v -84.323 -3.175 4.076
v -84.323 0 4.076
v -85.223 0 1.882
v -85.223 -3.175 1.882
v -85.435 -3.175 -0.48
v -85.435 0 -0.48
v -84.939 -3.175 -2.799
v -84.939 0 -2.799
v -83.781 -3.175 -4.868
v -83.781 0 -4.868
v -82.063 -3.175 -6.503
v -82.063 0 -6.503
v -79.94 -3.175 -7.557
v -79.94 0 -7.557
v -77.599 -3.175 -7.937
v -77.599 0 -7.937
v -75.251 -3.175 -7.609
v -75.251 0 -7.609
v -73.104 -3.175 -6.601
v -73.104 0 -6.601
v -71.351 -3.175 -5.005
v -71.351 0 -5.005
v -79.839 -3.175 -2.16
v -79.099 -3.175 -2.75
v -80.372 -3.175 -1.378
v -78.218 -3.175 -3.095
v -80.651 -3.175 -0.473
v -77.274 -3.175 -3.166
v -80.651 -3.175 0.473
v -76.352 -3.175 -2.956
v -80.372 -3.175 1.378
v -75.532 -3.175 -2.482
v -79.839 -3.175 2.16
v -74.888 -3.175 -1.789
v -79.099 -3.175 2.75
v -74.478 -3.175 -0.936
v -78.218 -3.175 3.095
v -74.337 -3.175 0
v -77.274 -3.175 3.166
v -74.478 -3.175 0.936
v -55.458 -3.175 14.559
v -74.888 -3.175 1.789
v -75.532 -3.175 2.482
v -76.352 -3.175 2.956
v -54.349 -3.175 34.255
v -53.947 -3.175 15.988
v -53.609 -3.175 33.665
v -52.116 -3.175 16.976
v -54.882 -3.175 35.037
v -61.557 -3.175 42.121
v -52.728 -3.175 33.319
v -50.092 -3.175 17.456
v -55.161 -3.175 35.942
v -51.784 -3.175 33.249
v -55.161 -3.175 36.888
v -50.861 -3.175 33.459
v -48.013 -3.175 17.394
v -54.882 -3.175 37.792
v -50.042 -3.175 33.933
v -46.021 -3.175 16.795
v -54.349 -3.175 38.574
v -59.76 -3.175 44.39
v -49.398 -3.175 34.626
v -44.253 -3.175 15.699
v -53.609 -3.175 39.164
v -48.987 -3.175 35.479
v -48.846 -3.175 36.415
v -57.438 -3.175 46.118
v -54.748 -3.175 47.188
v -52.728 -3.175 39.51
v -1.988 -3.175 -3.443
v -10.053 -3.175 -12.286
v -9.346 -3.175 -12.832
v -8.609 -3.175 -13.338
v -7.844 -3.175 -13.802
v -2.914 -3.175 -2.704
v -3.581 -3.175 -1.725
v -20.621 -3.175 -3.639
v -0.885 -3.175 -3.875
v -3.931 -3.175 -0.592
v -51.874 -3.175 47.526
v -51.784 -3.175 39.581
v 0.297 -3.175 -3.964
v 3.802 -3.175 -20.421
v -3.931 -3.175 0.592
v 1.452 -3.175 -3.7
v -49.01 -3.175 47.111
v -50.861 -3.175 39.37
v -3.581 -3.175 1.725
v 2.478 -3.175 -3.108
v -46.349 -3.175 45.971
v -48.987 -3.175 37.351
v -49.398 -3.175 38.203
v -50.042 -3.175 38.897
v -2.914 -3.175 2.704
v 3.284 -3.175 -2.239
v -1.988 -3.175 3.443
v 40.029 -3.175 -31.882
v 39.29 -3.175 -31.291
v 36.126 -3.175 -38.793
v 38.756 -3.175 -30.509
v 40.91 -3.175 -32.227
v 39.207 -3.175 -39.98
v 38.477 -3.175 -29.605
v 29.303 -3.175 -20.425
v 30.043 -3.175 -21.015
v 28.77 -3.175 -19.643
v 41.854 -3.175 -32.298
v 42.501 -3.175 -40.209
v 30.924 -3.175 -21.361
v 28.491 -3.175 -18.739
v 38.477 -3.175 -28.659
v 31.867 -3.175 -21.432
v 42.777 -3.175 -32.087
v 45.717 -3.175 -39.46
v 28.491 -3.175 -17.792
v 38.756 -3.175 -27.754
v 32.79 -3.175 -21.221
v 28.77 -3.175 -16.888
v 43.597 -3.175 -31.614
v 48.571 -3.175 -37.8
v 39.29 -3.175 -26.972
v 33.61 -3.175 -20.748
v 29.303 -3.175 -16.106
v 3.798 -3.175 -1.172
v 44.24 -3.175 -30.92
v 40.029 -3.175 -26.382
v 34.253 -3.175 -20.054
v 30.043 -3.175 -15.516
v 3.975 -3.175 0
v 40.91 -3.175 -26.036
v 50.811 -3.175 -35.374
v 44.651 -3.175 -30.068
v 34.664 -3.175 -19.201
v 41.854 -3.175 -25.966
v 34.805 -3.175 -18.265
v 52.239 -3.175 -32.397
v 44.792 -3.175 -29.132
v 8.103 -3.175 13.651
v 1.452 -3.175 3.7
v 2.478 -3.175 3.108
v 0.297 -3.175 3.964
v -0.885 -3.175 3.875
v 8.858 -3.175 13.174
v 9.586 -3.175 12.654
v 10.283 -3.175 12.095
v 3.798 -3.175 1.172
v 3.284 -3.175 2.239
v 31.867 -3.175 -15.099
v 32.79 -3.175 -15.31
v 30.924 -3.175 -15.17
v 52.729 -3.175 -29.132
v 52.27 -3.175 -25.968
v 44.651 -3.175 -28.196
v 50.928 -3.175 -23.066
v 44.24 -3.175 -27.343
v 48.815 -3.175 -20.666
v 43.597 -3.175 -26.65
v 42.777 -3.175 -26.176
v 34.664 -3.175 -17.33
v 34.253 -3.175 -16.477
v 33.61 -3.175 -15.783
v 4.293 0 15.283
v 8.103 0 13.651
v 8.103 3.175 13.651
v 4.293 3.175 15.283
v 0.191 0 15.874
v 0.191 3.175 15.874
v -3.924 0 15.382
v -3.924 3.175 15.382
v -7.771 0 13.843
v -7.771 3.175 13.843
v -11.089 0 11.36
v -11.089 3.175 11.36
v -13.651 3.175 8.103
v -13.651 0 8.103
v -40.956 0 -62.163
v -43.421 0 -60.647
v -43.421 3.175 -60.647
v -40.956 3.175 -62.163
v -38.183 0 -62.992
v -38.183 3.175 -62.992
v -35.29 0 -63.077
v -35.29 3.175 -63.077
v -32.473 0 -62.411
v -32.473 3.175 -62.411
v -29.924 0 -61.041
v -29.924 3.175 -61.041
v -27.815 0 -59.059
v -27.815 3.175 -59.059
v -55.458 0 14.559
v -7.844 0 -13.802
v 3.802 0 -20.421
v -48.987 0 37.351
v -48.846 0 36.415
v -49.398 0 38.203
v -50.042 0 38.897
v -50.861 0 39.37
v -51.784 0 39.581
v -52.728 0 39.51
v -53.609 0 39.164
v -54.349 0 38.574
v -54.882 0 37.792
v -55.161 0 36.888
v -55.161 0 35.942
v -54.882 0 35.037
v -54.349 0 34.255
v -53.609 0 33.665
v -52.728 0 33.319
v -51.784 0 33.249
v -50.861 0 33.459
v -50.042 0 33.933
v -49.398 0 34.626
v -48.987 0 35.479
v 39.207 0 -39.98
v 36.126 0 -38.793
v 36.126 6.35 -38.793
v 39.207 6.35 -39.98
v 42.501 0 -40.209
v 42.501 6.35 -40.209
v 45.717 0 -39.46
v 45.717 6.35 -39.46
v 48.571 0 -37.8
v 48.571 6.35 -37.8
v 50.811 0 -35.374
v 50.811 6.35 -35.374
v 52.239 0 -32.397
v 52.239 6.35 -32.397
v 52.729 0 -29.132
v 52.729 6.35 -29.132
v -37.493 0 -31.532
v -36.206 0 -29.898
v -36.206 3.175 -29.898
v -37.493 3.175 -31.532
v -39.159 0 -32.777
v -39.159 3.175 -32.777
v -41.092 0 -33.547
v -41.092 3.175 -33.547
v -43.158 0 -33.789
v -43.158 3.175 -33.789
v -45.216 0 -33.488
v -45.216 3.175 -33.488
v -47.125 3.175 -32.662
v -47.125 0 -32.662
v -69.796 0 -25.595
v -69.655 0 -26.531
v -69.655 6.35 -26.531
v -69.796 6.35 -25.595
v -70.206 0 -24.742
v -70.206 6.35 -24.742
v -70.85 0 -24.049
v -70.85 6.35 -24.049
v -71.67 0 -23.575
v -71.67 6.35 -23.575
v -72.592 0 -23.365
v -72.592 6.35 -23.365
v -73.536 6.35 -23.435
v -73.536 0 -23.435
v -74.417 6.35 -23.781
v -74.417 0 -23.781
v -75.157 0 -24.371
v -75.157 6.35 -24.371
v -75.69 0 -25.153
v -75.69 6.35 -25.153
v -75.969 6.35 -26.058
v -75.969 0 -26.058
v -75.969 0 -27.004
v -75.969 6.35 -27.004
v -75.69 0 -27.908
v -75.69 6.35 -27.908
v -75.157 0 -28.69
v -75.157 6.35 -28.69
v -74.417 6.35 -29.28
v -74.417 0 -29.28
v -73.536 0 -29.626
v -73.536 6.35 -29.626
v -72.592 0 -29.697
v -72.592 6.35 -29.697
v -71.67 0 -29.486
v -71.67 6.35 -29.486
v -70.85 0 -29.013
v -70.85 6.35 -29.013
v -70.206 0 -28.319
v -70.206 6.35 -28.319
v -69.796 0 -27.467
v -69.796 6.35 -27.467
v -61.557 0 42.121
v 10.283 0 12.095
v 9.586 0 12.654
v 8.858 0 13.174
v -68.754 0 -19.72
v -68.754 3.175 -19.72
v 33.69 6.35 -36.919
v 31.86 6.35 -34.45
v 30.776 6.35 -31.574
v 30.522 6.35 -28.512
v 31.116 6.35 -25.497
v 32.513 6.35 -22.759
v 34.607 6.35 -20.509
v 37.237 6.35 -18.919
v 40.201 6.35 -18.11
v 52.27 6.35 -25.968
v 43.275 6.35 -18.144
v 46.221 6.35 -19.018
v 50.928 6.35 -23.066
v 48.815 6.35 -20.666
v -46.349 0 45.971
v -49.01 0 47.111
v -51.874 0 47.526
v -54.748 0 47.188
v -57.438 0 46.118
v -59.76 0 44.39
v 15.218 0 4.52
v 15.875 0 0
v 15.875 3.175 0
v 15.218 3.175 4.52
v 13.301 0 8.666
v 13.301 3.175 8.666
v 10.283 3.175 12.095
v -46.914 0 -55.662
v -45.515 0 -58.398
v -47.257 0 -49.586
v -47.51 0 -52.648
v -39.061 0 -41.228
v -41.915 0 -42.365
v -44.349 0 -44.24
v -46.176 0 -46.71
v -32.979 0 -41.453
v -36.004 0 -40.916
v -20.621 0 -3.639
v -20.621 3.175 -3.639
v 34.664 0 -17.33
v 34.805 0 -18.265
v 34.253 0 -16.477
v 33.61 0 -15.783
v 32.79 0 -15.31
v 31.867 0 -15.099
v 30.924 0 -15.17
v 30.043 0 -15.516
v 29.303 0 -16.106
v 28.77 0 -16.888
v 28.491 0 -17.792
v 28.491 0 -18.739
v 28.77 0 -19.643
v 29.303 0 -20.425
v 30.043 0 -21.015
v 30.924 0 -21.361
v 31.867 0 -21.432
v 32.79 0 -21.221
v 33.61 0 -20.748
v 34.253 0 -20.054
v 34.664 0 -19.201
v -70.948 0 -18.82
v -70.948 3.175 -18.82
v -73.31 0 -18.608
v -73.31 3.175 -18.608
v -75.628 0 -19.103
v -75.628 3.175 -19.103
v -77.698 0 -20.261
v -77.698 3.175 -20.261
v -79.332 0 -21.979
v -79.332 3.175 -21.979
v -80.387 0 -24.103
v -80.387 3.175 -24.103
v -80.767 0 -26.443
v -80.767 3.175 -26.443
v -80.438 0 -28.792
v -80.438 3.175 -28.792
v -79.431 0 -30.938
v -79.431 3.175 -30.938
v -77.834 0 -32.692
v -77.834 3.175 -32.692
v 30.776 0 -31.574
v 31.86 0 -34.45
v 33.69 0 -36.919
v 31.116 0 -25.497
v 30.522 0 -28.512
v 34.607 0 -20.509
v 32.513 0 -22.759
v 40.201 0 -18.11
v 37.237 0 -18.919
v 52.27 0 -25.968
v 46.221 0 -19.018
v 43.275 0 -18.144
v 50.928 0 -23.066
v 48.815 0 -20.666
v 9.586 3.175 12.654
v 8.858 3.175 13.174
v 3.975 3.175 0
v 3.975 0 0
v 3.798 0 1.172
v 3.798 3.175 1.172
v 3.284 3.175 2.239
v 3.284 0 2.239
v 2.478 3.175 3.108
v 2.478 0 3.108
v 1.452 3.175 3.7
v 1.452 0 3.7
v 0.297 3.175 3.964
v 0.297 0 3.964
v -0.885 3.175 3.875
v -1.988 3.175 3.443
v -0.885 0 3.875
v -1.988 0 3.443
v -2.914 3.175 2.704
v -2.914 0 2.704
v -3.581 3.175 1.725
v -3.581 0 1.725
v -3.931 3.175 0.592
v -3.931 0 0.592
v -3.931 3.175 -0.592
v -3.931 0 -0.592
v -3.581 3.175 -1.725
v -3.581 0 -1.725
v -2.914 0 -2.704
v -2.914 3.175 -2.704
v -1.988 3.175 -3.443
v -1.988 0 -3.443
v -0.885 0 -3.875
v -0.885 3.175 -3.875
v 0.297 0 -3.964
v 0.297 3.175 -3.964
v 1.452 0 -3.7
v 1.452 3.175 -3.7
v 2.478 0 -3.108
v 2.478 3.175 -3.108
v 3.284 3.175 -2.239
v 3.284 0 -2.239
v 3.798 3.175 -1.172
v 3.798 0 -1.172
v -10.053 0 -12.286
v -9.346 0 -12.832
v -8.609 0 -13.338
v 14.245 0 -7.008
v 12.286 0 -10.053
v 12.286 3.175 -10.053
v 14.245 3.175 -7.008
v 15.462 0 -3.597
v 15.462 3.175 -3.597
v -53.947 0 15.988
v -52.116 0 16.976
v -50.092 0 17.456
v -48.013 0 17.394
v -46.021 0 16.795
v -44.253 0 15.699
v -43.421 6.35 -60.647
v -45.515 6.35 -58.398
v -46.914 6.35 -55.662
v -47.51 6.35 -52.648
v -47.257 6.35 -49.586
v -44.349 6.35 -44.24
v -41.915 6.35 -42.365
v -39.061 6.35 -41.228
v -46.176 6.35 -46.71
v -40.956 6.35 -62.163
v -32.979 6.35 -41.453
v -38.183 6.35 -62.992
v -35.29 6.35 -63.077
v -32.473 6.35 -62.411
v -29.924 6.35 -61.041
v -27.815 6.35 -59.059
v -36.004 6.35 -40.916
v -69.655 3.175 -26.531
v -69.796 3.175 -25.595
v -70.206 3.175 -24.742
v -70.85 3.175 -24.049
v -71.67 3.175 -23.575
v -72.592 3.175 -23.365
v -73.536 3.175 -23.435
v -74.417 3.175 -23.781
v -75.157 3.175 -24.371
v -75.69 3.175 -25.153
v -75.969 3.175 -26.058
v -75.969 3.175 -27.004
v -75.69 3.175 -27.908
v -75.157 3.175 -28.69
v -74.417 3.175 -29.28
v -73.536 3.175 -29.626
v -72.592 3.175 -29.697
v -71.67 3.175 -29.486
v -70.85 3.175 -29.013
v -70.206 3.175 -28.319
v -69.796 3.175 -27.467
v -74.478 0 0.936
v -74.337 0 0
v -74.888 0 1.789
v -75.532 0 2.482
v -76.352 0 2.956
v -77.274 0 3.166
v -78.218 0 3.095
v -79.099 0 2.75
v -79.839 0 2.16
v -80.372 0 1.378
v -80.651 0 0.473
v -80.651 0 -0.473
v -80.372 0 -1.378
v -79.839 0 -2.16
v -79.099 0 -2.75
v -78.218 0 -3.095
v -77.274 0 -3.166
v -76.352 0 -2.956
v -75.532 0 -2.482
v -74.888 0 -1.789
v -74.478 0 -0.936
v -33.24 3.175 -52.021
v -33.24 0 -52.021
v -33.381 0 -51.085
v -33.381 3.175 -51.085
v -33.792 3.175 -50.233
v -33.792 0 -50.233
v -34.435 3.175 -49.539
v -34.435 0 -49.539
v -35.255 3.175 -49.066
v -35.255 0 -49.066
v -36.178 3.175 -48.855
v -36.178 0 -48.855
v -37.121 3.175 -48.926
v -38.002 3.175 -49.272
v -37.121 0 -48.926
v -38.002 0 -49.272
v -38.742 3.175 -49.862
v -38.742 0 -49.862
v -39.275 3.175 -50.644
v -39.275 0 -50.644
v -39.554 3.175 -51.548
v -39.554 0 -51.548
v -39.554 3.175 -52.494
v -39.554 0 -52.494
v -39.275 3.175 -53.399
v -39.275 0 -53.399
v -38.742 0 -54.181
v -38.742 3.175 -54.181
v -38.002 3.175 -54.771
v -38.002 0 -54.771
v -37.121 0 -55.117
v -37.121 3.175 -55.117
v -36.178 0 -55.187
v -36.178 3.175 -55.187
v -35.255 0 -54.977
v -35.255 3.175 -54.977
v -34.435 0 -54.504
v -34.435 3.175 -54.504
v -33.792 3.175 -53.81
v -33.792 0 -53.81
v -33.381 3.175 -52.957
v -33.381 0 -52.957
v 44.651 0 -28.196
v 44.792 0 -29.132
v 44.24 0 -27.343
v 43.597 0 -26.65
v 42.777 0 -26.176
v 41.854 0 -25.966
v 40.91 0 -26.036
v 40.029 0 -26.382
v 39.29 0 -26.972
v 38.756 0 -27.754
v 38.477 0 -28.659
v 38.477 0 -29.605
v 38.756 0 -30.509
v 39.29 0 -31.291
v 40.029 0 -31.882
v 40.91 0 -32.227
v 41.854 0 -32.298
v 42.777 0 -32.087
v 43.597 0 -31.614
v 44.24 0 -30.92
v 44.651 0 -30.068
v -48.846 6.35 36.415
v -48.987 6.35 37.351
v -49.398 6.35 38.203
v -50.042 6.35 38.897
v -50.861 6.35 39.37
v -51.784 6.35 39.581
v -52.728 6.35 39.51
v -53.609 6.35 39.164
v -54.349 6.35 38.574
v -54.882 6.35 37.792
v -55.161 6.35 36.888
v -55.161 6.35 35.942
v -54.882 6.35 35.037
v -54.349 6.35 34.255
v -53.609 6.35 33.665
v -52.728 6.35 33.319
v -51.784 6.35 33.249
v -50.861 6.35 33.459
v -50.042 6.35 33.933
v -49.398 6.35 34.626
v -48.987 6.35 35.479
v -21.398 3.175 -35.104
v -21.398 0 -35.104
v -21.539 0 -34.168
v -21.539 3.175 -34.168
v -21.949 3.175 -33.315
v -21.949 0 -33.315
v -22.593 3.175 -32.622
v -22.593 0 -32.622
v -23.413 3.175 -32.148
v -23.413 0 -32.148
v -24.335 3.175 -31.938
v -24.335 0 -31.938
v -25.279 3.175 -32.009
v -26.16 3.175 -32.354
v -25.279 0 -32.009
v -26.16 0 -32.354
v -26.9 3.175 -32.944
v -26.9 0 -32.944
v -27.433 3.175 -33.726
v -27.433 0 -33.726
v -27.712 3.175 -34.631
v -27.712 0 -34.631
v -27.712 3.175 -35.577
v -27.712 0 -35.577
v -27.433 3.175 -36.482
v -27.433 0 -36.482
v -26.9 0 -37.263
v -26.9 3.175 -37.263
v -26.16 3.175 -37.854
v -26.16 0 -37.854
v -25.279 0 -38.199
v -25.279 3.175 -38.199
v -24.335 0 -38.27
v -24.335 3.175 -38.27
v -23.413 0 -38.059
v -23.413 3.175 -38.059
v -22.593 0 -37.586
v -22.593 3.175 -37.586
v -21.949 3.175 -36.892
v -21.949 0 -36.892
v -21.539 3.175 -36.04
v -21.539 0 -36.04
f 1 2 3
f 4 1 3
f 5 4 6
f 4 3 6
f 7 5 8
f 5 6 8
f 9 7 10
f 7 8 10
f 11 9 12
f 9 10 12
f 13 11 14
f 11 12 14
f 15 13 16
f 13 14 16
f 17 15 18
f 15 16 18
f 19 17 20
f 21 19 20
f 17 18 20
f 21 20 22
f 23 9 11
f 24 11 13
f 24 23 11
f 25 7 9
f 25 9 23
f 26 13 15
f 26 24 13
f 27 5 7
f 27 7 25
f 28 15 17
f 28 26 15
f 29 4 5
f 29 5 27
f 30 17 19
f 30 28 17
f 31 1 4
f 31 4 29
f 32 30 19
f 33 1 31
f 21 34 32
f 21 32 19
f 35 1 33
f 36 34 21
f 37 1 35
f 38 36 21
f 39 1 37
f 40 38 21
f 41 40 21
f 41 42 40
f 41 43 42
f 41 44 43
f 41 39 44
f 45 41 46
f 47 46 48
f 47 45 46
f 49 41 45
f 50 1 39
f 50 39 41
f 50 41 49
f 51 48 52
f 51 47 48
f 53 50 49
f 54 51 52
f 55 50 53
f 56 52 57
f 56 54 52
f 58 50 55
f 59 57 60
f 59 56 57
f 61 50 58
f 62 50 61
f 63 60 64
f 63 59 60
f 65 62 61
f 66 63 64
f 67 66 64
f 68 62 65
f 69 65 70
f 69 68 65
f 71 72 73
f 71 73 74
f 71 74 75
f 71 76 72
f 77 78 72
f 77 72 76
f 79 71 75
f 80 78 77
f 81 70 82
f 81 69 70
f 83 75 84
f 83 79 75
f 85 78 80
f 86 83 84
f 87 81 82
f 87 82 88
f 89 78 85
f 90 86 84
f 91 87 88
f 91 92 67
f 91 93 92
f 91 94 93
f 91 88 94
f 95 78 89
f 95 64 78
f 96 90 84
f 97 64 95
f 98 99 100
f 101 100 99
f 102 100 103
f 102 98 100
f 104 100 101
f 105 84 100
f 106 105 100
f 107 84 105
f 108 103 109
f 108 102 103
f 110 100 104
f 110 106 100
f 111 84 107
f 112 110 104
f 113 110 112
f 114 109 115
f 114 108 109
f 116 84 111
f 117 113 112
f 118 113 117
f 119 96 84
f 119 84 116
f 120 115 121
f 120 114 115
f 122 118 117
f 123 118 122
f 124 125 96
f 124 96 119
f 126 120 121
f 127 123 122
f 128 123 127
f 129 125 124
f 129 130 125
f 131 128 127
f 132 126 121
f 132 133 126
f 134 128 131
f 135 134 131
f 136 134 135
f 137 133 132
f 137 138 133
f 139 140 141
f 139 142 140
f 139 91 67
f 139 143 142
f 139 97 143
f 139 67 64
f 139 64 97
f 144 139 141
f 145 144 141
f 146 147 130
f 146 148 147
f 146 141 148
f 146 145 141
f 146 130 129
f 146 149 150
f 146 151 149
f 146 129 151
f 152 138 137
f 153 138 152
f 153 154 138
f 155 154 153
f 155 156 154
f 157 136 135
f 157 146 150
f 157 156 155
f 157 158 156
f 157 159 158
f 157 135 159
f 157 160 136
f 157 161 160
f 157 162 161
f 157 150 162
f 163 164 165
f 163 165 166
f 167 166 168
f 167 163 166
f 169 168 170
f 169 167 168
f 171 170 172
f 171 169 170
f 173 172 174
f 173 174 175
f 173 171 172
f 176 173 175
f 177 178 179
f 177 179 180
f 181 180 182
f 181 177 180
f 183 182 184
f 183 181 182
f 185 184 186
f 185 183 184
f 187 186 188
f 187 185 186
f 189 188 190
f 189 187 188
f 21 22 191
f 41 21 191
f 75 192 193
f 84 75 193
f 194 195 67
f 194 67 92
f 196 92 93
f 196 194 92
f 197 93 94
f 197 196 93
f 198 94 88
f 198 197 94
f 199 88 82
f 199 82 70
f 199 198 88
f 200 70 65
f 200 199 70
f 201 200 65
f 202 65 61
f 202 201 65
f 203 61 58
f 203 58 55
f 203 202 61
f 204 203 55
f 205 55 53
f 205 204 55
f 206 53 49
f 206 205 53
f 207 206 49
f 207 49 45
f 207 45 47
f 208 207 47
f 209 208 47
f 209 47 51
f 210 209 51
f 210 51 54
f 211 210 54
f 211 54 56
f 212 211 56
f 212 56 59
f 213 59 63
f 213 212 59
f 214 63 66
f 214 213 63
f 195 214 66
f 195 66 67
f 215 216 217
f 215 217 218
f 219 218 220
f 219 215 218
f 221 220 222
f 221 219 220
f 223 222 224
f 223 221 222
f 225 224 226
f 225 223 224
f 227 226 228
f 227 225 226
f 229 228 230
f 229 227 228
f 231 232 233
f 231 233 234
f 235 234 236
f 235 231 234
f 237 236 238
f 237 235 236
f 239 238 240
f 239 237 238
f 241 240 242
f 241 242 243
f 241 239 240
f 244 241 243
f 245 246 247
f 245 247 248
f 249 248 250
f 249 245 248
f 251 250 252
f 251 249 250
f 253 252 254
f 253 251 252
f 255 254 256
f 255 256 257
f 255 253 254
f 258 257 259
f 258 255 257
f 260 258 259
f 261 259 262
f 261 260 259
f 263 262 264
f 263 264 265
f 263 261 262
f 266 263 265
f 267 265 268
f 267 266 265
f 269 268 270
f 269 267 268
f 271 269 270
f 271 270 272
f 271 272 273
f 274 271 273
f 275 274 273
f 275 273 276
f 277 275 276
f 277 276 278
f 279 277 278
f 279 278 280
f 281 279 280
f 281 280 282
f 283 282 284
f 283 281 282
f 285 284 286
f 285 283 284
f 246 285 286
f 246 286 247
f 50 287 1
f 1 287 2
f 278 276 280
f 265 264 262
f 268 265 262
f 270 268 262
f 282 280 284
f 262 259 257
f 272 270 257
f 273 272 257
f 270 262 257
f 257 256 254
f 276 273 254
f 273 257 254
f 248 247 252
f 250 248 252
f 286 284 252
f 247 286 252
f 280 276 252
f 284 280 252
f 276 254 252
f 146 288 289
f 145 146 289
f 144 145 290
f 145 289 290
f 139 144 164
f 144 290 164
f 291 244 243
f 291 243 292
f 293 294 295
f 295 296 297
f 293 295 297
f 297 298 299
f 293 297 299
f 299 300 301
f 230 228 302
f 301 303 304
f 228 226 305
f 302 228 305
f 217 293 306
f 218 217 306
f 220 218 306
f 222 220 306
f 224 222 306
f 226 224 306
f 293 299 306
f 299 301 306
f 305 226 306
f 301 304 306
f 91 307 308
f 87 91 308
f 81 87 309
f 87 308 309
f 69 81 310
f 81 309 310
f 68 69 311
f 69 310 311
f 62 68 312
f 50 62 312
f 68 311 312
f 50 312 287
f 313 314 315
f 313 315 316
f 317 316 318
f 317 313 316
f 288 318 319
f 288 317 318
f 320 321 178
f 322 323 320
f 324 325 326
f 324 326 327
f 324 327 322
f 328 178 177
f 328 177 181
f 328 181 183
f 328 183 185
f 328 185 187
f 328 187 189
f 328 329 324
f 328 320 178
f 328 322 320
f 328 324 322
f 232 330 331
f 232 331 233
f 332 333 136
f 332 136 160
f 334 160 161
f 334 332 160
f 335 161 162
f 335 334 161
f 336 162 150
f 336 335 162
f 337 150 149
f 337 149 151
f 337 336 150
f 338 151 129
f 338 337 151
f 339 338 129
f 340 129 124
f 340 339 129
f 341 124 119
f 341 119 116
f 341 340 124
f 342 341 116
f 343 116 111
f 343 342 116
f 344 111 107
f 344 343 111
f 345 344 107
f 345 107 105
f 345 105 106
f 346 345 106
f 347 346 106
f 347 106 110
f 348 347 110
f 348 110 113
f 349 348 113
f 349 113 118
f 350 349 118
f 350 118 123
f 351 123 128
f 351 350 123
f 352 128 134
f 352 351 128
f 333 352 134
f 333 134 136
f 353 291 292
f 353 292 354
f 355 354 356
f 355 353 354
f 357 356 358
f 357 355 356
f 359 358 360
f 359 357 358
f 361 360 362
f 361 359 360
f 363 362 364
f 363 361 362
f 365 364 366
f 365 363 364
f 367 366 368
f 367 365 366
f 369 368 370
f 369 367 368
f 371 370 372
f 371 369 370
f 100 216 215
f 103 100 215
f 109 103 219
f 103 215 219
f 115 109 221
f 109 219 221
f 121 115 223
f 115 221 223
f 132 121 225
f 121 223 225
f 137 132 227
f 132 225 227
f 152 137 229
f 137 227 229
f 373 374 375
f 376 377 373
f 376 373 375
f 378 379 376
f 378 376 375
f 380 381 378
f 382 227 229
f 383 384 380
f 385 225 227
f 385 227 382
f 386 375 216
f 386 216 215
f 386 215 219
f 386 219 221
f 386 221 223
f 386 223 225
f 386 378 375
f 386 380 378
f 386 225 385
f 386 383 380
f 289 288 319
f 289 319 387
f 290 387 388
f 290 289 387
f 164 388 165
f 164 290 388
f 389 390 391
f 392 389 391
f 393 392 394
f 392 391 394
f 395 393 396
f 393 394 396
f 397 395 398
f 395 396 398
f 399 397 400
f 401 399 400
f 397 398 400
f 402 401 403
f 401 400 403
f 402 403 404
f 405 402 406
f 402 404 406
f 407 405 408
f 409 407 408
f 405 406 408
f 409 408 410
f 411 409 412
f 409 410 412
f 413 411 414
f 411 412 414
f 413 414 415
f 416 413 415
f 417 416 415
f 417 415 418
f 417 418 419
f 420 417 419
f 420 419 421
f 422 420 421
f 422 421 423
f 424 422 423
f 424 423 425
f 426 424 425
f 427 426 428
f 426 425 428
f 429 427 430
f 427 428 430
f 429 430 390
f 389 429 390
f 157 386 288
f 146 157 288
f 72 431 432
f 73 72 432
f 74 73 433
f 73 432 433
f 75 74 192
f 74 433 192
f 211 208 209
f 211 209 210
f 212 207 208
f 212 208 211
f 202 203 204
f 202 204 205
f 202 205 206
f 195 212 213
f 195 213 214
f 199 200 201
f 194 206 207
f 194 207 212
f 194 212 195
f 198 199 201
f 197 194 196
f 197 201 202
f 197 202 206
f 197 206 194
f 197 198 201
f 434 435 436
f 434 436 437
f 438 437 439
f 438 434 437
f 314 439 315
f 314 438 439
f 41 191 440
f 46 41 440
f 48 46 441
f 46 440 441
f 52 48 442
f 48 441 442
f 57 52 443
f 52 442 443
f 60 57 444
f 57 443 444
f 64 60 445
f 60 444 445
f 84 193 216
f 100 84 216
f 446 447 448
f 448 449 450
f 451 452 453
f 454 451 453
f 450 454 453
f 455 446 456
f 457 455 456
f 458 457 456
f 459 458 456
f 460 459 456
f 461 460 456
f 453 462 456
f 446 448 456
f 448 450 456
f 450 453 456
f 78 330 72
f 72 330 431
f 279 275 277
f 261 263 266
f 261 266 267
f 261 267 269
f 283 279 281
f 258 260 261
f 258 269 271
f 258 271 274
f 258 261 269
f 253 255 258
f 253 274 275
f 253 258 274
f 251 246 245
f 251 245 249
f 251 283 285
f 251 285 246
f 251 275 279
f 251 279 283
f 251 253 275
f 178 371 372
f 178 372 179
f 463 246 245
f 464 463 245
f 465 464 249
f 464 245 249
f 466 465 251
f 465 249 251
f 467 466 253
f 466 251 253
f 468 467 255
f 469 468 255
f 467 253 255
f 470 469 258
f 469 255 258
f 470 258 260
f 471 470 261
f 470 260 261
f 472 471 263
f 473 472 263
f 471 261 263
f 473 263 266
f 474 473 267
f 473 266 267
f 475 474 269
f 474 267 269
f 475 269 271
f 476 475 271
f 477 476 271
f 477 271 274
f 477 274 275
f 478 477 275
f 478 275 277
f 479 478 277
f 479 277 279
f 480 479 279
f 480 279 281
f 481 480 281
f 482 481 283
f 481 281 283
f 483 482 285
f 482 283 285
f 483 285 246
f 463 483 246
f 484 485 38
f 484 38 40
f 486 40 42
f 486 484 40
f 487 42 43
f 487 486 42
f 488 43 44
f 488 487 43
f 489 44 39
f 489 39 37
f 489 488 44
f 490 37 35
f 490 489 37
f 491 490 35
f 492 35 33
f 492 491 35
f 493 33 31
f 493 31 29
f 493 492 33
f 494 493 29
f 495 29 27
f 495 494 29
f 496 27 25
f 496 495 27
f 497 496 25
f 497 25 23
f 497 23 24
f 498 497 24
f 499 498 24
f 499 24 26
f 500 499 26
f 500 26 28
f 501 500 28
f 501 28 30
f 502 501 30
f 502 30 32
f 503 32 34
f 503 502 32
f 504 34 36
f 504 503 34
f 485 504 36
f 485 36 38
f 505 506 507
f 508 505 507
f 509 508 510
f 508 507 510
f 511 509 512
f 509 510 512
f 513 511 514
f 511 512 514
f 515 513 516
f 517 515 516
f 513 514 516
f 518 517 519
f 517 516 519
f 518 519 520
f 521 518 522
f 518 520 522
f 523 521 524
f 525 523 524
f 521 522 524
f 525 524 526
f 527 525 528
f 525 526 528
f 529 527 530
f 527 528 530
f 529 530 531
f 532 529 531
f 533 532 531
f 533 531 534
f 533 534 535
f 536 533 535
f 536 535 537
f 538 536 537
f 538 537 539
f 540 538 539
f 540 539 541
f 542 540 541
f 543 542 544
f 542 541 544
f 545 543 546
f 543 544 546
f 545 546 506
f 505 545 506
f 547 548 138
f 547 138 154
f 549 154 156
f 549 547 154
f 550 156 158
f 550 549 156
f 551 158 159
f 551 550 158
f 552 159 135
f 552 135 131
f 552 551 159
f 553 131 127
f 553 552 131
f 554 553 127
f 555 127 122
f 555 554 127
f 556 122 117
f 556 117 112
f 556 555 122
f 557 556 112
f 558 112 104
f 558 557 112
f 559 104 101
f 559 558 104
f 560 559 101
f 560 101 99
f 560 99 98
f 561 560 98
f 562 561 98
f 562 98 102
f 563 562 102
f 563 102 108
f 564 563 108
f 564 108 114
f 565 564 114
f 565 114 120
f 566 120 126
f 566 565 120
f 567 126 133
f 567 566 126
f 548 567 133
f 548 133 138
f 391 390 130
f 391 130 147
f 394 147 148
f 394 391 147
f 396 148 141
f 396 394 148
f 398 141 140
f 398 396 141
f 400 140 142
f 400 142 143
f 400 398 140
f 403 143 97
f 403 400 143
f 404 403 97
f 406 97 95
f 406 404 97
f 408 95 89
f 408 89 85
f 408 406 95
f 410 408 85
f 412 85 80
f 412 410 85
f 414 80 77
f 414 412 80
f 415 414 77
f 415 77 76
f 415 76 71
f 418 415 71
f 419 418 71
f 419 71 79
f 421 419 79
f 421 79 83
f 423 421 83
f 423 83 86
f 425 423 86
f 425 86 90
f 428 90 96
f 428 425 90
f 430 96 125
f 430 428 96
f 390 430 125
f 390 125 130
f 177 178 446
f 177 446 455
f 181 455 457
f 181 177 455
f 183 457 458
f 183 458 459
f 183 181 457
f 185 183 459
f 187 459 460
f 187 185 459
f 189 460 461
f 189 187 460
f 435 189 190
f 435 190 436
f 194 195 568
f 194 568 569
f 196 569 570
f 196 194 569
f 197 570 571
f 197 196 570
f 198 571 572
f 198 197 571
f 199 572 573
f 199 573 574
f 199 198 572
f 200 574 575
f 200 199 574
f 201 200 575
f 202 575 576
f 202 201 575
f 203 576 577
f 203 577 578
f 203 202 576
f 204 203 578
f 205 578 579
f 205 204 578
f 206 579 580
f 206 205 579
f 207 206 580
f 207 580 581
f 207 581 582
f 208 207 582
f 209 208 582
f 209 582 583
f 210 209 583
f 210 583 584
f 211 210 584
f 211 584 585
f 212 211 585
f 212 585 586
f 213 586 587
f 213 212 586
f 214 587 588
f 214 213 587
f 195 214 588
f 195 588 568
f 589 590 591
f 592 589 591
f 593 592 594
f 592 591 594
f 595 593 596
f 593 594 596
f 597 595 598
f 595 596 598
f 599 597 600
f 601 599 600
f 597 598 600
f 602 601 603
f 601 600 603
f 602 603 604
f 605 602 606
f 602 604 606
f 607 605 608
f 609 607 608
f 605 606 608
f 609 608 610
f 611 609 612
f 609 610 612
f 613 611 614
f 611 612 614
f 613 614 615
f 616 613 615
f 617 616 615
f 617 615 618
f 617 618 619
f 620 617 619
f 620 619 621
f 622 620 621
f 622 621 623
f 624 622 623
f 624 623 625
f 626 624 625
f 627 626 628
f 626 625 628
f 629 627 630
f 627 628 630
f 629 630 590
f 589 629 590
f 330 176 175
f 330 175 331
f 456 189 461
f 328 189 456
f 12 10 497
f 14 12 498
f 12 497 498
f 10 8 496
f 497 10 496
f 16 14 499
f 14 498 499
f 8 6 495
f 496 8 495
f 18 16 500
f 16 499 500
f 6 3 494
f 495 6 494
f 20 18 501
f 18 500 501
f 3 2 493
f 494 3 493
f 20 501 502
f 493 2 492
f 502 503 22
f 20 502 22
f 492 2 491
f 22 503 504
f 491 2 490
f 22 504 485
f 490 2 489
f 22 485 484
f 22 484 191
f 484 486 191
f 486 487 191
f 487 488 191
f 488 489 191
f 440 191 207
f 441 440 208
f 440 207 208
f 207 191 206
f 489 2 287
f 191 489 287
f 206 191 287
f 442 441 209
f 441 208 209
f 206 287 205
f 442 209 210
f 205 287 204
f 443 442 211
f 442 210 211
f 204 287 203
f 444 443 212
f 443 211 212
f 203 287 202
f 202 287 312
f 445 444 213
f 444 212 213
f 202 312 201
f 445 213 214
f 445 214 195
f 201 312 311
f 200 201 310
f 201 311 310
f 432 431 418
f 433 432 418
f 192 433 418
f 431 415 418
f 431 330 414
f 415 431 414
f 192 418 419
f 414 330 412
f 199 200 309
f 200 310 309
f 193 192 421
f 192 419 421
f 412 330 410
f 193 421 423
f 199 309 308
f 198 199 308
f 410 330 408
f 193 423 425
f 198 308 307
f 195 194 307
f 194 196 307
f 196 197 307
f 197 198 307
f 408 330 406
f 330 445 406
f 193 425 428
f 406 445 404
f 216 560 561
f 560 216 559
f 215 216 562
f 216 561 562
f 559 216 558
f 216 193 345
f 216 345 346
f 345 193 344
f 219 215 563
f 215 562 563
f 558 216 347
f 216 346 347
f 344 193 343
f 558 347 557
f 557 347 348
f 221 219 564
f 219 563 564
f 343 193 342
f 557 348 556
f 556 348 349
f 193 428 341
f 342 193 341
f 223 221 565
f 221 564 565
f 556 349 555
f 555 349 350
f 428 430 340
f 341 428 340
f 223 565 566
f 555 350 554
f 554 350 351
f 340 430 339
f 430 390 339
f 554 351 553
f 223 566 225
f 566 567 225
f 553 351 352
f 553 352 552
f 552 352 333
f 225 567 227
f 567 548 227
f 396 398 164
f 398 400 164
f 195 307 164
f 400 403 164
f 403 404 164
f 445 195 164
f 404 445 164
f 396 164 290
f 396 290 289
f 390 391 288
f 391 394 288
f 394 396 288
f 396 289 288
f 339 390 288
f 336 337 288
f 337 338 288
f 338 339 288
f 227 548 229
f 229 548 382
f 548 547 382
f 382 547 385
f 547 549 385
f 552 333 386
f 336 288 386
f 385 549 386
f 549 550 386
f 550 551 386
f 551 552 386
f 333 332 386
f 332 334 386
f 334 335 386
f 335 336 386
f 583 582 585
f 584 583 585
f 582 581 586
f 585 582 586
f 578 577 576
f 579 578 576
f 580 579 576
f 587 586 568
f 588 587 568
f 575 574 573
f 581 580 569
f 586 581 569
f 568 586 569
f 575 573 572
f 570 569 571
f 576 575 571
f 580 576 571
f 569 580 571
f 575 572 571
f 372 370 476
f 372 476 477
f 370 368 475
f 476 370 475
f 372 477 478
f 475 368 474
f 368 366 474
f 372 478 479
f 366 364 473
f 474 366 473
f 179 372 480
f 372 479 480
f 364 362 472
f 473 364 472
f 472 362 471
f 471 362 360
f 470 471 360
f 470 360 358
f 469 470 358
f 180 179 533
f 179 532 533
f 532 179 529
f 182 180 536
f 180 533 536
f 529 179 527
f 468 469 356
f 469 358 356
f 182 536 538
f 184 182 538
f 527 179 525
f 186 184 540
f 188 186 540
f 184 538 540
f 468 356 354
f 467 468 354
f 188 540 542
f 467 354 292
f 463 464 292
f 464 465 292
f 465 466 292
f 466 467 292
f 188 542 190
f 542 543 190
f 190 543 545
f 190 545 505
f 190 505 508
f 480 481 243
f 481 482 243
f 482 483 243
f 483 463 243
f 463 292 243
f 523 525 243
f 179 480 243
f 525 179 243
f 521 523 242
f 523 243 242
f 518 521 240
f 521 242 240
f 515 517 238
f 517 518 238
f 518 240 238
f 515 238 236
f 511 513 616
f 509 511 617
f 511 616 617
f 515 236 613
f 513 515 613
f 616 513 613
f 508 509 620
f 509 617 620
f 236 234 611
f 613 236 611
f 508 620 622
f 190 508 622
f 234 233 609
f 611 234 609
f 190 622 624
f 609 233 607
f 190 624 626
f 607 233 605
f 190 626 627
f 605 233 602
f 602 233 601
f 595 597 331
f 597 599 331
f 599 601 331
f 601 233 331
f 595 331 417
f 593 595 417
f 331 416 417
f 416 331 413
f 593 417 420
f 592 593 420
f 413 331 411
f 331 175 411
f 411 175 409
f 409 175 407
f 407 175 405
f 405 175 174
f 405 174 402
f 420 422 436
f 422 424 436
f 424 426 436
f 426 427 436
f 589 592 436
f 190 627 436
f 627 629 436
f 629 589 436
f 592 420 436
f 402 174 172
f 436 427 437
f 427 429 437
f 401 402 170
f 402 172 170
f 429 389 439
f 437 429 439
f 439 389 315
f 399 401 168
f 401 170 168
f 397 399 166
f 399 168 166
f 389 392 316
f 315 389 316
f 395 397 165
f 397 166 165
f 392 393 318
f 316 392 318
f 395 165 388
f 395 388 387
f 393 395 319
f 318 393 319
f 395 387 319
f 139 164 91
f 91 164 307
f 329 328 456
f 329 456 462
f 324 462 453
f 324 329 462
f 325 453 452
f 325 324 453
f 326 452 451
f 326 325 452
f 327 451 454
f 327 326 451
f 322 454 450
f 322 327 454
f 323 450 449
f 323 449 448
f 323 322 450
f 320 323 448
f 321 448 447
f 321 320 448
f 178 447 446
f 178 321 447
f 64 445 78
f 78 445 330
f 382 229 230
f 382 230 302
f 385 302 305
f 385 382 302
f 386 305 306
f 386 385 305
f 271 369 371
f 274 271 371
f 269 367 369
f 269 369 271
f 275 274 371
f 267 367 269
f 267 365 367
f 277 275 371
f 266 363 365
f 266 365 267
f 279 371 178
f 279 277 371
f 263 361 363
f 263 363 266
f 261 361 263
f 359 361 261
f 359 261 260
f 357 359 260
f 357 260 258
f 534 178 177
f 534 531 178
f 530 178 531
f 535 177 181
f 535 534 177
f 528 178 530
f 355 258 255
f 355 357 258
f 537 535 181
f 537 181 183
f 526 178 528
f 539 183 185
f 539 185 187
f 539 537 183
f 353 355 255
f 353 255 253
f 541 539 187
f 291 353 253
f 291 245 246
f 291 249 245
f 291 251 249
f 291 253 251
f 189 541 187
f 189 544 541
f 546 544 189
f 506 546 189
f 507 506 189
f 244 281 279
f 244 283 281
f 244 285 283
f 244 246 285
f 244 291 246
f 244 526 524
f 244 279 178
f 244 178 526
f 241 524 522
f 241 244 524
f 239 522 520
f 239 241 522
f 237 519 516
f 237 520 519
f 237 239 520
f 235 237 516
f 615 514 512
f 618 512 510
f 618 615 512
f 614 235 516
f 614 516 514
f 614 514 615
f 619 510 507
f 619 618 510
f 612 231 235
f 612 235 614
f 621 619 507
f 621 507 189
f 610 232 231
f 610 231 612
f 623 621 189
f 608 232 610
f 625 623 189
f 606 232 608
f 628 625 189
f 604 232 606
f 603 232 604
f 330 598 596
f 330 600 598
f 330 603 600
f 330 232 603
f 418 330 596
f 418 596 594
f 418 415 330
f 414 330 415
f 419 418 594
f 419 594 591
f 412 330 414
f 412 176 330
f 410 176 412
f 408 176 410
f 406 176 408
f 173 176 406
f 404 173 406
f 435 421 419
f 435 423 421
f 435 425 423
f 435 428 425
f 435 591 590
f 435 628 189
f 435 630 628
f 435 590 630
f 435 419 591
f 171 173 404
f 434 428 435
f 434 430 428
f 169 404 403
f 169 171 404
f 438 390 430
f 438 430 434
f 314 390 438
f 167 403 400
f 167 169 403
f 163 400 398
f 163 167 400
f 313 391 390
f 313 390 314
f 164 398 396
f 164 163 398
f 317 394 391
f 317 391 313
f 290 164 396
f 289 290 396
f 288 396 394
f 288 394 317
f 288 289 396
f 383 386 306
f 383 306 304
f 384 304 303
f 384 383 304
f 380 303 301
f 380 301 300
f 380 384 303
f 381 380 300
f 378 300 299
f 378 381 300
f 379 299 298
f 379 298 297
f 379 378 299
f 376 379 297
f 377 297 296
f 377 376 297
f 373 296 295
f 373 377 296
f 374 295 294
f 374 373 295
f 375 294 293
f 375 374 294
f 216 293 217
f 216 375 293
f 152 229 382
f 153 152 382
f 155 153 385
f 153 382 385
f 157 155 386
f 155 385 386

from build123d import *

# Parameters (mm, degrees)
F0_R     = 3.175
F0_R_2   = 3.9751
F1_DEPTH = 3.175
F2_DEPTH = 3.175
F3_DEPTH = 6.35


with BuildPart() as f1:
    # F0 (on Front) → F1 (new body)
    with BuildSketch(Plane.XZ):
        with BuildLine():
            ThreePointArc((-46.3493534686, 45.9708783013), (-54.7484486293, 47.1875056253), (-61.5568739456, 42.1209164099))
            ThreePointArc((-61.5568739456, 42.1209164099), (-54.9811913991, 25.7038240558), (-40.908726953, 36.4148588671))
            ThreePointArc((-40.908726953, 36.4148588671), (-42.3641997099, 41.9129931941), (-46.3493534686, 45.9708783013))
        make_face()
        with Locations((-52.021226953, 36.4148588671)):
            Circle(F0_R, mode=Mode.SUBTRACT)
        with BuildLine():
            ThreePointArc((-84.3228045832, 4.0757553877), (-75.3973678413, 7.6507391509), (-69.5741281599, 0))
            ThreePointArc((-69.5741281599, 0), (-70.031449753, -2.6553412683), (-71.3507170735, -5.004705869))
            Line((-71.3507170735, -5.004705869), (-55.4583719126, 14.5591462439))
            ThreePointArc((-55.4583719126, 14.5591462439), (-50.0923114236, 17.4558022885), (-44.252824382, 15.6992111283))
            Line((-44.252824382, 15.6992111283), (-20.6205567973, -3.6389217878))
            Line((-20.6205567973, -3.6389217878), (-13.6514563346, 8.1026764062))
            ThreePointArc((-13.6514563346, 8.1026764062), (-3.9235799147, 15.3824947799), (8.1026764062, 13.6514563346))
            Line((8.1026764062, 13.6514563346), (-46.3493534686, 45.9708783013))
            ThreePointArc((-46.3493534686, 45.9708783013), (-42.3641997099, 41.9129931941), (-40.908726953, 36.4148588671))
            ThreePointArc((-40.908726953, 36.4148588671), (-54.9811913991, 25.7038240558), (-61.5568739456, 42.1209164099))
            Line((-61.5568739456, 42.1209164099), (-84.3228045832, 4.0757553877))
        make_face()
        with BuildLine():
            ThreePointArc((-71.3507170735, -5.004705869), (-70.031449753, -2.6553412683), (-69.5741281599, 0))
            ThreePointArc((-69.5741281599, 0), (-75.3973678413, 7.6507391509), (-84.3228045832, 4.0757553877))
            ThreePointArc((-84.3228045832, 4.0757553877), (-82.0634855183, -6.5026533691), (-71.3507170735, -5.004705869))
        make_face()
        with Locations((-77.5116281599, 0)):
            Circle(F0_R, mode=Mode.SUBTRACT)
        with BuildLine():
            ThreePointArc((10.2828673712, 12.0945551231), (9.2256728938, 12.9190783207), (8.1026764062, 13.6514563346))
            ThreePointArc((8.1026764062, 13.6514563346), (-3.9235799147, 15.3824947799), (-13.6514563346, 8.1026764062))
            ThreePointArc((-13.6514563346, 8.1026764062), (-15.6334389962, -2.7588421758), (-10.053472417, -12.2858991271))
            ThreePointArc((-10.053472417, -12.2858991271), (-8.9809506531, -13.0903838892), (-7.8443723578, -13.8015016325))
            ThreePointArc((-7.8443723578, -13.8015016325), (2.9058081081, -15.6067903247), (12.2858991271, -10.053472417))
            ThreePointArc((12.2858991271, -10.053472417), (14.9508239513, -5.3374608363), (15.875, 0))
            ThreePointArc((15.875, 0), (14.4093050582, 6.6623984226), (10.2828673712, 12.0945551231))
        make_face()
        Circle(F0_R_2, mode=Mode.SUBTRACT)
        with BuildLine():
            Line((-13.6514563346, 8.1026764062), (-20.6205567973, -3.6389217878))
            Line((-20.6205567973, -3.6389217878), (-10.053472417, -12.2858991271))
            ThreePointArc((-10.053472417, -12.2858991271), (-15.6334389962, -2.7588421758), (-13.6514563346, 8.1026764062))
        make_face()
        with BuildLine():
            ThreePointArc((12.2858991271, -10.053472417), (2.9058081081, -15.6067903247), (-7.8443723578, -13.8015016325))
            Line((-7.8443723578, -13.8015016325), (3.8021703794, -20.4210579927))
            Line((3.8021703794, -20.4210579927), (12.2858991271, -10.053472417))
        make_face()
        with BuildLine():
            Line((48.8149887222, -20.6656985075), (10.2828673712, 12.0945551231))
            ThreePointArc((10.2828673712, 12.0945551231), (14.4093050582, 6.6623984226), (15.875, 0))
            ThreePointArc((15.875, 0), (14.9508239513, -5.3374608363), (12.2858991271, -10.053472417))
            Line((12.2858991271, -10.053472417), (3.8021703794, -20.4210579927))
            Line((3.8021703794, -20.4210579927), (36.1259209119, -38.7929382364))
            ThreePointArc((36.1259209119, -38.7929382364), (32.5132668456, -22.7592867919), (48.8149887222, -20.6656985075))
        make_face()
        with Locations((31.630088017, -18.2654802039)):
            Circle(F0_R, mode=Mode.SUBTRACT)
        with BuildLine():
            ThreePointArc((52.7294815624, -29.1318870937), (51.7034951031, -24.4682081979), (48.8149887222, -20.6656985075))
            ThreePointArc((48.8149887222, -20.6656985075), (32.5132668456, -22.7592867919), (36.1259209119, -38.7929382364))
            ThreePointArc((36.1259209119, -38.7929382364), (47.2057311887, -38.7367574137), (52.7294815624, -29.1318870937))
        make_face()
        with Locations((41.6169815624, -29.1318870937)):
            Circle(F0_R, mode=Mode.SUBTRACT)
    extrude(amount=F1_DEPTH)


with BuildPart() as f2:
    # F0 (on Front) → F2 (new body)
    with BuildSketch(Plane.XZ):
        with BuildLine():
            Line((-10.053472417, -12.2858991271), (-20.6205567973, -3.6389217878))
            Line((-20.6205567973, -3.6389217878), (-36.206279503, -29.8978765198))
            ThreePointArc((-36.206279503, -29.8978765198), (-41.0917965274, -33.5471154563), (-47.1252054317, -32.6621304811))
            Line((-47.1252054317, -32.6621304811), (-68.7539623464, -19.7196493227))
            ThreePointArc((-68.7539623464, -19.7196493227), (-65.9248203909, -22.6159440198), (-64.8922177341, -26.530825746))
            ThreePointArc((-64.8922177341, -26.530825746), (-69.4180426753, -33.6977204392), (-77.8344236032, -32.6917368324))
            Line((-77.8344236032, -32.6917368324), (-43.4214470837, -60.6465024739))
            ThreePointArc((-43.4214470837, -60.6465024739), (-46.1761535956, -46.7104095514), (-32.978986563, -41.4532357645))
            ThreePointArc((-32.978986563, -41.4532357645), (-27.4240639292, -45.4902804185), (-25.3023588671, -52.021226953))
            ThreePointArc((-25.3023588671, -52.021226953), (-25.9492821012, -55.7574495383), (-27.8147294781, -59.0586576448))
            Line((-27.8147294781, -59.0586576448), (3.8021703794, -20.4210579927))
            Line((3.8021703794, -20.4210579927), (-7.8443723578, -13.8015016325))
            ThreePointArc((-7.8443723578, -13.8015016325), (-8.9809506531, -13.0903838892), (-10.053472417, -12.2858991271))
        make_face()
        with Locations((-24.5727467635, -35.1039239479)):
            Circle(F0_R, mode=Mode.SUBTRACT)
        with BuildLine():
            ThreePointArc((-43.4214470837, -60.6465024739), (-35.2900672565, -63.0766554875), (-27.8147294781, -59.0586576448))
            Line((-27.8147294781, -59.0586576448), (-32.978986563, -41.4532357645))
            ThreePointArc((-32.978986563, -41.4532357645), (-46.1761535956, -46.7104095514), (-43.4214470837, -60.6465024739))
        make_face()
        with Locations((-36.4148588671, -52.021226953)):
            Circle(F0_R, mode=Mode.SUBTRACT)
        with BuildLine():
            ThreePointArc((-64.8922177341, -26.530825746), (-65.9248203909, -22.6159440198), (-68.7539623464, -19.7196493227))
            ThreePointArc((-68.7539623464, -19.7196493227), (-79.3323711033, -21.9789683876), (-77.8344236032, -32.6917368324))
            ThreePointArc((-77.8344236032, -32.6917368324), (-69.4180426753, -33.6977204392), (-64.8922177341, -26.530825746))
        make_face()
        with Locations((-72.8297177341, -26.530825746)):
            Circle(F0_R, mode=Mode.SUBTRACT)
        with BuildLine():
            ThreePointArc((10.2828673712, 12.0945551231), (9.2256728938, 12.9190783207), (8.1026764062, 13.6514563346))
            ThreePointArc((8.1026764062, 13.6514563346), (-3.9235799147, 15.3824947799), (-13.6514563346, 8.1026764062))
            ThreePointArc((-13.6514563346, 8.1026764062), (-15.6334389962, -2.7588421758), (-10.053472417, -12.2858991271))
            ThreePointArc((-10.053472417, -12.2858991271), (-8.9809506531, -13.0903838892), (-7.8443723578, -13.8015016325))
            ThreePointArc((-7.8443723578, -13.8015016325), (2.9058081081, -15.6067903247), (12.2858991271, -10.053472417))
            ThreePointArc((12.2858991271, -10.053472417), (14.9508239513, -5.3374608363), (15.875, 0))
            ThreePointArc((15.875, 0), (14.4093050582, 6.6623984226), (10.2828673712, 12.0945551231))
        make_face()
        Circle(F0_R_2, mode=Mode.SUBTRACT)
        with BuildLine():
            ThreePointArc((12.2858991271, -10.053472417), (2.9058081081, -15.6067903247), (-7.8443723578, -13.8015016325))
            Line((-7.8443723578, -13.8015016325), (3.8021703794, -20.4210579927))
            Line((3.8021703794, -20.4210579927), (12.2858991271, -10.053472417))
        make_face()
        with BuildLine():
            Line((-13.6514563346, 8.1026764062), (-20.6205567973, -3.6389217878))
            Line((-20.6205567973, -3.6389217878), (-10.053472417, -12.2858991271))
            ThreePointArc((-10.053472417, -12.2858991271), (-15.6334389962, -2.7588421758), (-13.6514563346, 8.1026764062))
        make_face()
        with BuildLine():
            Line((-32.978986563, -41.4532357645), (-27.8147294781, -59.0586576448))
            ThreePointArc((-27.8147294781, -59.0586576448), (-25.9492821012, -55.7574495383), (-25.3023588671, -52.021226953))
            ThreePointArc((-25.3023588671, -52.021226953), (-27.4240639292, -45.4902804185), (-32.978986563, -41.4532357645))
        make_face()
    extrude(amount=-F2_DEPTH)


with BuildPart() as f3:
    # F0 (on Front) → F3 (new body)
    with BuildSketch(Plane.XZ):
        with BuildLine():
            ThreePointArc((-43.4214470837, -60.6465024739), (-35.2900672565, -63.0766554875), (-27.8147294781, -59.0586576448))
            Line((-27.8147294781, -59.0586576448), (-32.978986563, -41.4532357645))
            ThreePointArc((-32.978986563, -41.4532357645), (-46.1761535956, -46.7104095514), (-43.4214470837, -60.6465024739))
        make_face()
        with Locations((-36.4148588671, -52.021226953)):
            Circle(F0_R, mode=Mode.SUBTRACT)
        with Locations((-36.4148588671, -52.021226953)):
            Circle(F0_R)
    extrude(amount=-F3_DEPTH)


with BuildPart() as f3b:
    # F0 (on Front) → F3, piece 2 (new body)
    with BuildSketch(Plane.XZ):
        with Locations((-72.8297177341, -26.530825746)):
            Circle(F0_R)
    extrude(amount=-F3_DEPTH)


with BuildPart() as f3c:
    # F0 (on Front) → F3, piece 3 (new body)
    with BuildSketch(Plane.XZ):
        with BuildLine():
            ThreePointArc((52.7294815624, -29.1318870937), (51.7034951031, -24.4682081979), (48.8149887222, -20.6656985075))
            ThreePointArc((48.8149887222, -20.6656985075), (32.5132668456, -22.7592867919), (36.1259209119, -38.7929382364))
            ThreePointArc((36.1259209119, -38.7929382364), (47.2057311887, -38.7367574137), (52.7294815624, -29.1318870937))
        make_face()
        with Locations((41.6169815624, -29.1318870937)):
            Circle(F0_R, mode=Mode.SUBTRACT)
        with Locations((41.6169815624, -29.1318870937)):
            Circle(F0_R)
    extrude(amount=-F3_DEPTH)


with BuildPart() as f3d:
    # F0 (on Front) → F3, piece 4 (new body)
    with BuildSketch(Plane.XZ):
        with Locations((-52.021226953, 36.4148588671)):
            Circle(F0_R)
    extrude(amount=-F3_DEPTH)


solid = Compound([f1.part, f2.part, f3.part, f3b.part, f3c.part, f3d.part])
